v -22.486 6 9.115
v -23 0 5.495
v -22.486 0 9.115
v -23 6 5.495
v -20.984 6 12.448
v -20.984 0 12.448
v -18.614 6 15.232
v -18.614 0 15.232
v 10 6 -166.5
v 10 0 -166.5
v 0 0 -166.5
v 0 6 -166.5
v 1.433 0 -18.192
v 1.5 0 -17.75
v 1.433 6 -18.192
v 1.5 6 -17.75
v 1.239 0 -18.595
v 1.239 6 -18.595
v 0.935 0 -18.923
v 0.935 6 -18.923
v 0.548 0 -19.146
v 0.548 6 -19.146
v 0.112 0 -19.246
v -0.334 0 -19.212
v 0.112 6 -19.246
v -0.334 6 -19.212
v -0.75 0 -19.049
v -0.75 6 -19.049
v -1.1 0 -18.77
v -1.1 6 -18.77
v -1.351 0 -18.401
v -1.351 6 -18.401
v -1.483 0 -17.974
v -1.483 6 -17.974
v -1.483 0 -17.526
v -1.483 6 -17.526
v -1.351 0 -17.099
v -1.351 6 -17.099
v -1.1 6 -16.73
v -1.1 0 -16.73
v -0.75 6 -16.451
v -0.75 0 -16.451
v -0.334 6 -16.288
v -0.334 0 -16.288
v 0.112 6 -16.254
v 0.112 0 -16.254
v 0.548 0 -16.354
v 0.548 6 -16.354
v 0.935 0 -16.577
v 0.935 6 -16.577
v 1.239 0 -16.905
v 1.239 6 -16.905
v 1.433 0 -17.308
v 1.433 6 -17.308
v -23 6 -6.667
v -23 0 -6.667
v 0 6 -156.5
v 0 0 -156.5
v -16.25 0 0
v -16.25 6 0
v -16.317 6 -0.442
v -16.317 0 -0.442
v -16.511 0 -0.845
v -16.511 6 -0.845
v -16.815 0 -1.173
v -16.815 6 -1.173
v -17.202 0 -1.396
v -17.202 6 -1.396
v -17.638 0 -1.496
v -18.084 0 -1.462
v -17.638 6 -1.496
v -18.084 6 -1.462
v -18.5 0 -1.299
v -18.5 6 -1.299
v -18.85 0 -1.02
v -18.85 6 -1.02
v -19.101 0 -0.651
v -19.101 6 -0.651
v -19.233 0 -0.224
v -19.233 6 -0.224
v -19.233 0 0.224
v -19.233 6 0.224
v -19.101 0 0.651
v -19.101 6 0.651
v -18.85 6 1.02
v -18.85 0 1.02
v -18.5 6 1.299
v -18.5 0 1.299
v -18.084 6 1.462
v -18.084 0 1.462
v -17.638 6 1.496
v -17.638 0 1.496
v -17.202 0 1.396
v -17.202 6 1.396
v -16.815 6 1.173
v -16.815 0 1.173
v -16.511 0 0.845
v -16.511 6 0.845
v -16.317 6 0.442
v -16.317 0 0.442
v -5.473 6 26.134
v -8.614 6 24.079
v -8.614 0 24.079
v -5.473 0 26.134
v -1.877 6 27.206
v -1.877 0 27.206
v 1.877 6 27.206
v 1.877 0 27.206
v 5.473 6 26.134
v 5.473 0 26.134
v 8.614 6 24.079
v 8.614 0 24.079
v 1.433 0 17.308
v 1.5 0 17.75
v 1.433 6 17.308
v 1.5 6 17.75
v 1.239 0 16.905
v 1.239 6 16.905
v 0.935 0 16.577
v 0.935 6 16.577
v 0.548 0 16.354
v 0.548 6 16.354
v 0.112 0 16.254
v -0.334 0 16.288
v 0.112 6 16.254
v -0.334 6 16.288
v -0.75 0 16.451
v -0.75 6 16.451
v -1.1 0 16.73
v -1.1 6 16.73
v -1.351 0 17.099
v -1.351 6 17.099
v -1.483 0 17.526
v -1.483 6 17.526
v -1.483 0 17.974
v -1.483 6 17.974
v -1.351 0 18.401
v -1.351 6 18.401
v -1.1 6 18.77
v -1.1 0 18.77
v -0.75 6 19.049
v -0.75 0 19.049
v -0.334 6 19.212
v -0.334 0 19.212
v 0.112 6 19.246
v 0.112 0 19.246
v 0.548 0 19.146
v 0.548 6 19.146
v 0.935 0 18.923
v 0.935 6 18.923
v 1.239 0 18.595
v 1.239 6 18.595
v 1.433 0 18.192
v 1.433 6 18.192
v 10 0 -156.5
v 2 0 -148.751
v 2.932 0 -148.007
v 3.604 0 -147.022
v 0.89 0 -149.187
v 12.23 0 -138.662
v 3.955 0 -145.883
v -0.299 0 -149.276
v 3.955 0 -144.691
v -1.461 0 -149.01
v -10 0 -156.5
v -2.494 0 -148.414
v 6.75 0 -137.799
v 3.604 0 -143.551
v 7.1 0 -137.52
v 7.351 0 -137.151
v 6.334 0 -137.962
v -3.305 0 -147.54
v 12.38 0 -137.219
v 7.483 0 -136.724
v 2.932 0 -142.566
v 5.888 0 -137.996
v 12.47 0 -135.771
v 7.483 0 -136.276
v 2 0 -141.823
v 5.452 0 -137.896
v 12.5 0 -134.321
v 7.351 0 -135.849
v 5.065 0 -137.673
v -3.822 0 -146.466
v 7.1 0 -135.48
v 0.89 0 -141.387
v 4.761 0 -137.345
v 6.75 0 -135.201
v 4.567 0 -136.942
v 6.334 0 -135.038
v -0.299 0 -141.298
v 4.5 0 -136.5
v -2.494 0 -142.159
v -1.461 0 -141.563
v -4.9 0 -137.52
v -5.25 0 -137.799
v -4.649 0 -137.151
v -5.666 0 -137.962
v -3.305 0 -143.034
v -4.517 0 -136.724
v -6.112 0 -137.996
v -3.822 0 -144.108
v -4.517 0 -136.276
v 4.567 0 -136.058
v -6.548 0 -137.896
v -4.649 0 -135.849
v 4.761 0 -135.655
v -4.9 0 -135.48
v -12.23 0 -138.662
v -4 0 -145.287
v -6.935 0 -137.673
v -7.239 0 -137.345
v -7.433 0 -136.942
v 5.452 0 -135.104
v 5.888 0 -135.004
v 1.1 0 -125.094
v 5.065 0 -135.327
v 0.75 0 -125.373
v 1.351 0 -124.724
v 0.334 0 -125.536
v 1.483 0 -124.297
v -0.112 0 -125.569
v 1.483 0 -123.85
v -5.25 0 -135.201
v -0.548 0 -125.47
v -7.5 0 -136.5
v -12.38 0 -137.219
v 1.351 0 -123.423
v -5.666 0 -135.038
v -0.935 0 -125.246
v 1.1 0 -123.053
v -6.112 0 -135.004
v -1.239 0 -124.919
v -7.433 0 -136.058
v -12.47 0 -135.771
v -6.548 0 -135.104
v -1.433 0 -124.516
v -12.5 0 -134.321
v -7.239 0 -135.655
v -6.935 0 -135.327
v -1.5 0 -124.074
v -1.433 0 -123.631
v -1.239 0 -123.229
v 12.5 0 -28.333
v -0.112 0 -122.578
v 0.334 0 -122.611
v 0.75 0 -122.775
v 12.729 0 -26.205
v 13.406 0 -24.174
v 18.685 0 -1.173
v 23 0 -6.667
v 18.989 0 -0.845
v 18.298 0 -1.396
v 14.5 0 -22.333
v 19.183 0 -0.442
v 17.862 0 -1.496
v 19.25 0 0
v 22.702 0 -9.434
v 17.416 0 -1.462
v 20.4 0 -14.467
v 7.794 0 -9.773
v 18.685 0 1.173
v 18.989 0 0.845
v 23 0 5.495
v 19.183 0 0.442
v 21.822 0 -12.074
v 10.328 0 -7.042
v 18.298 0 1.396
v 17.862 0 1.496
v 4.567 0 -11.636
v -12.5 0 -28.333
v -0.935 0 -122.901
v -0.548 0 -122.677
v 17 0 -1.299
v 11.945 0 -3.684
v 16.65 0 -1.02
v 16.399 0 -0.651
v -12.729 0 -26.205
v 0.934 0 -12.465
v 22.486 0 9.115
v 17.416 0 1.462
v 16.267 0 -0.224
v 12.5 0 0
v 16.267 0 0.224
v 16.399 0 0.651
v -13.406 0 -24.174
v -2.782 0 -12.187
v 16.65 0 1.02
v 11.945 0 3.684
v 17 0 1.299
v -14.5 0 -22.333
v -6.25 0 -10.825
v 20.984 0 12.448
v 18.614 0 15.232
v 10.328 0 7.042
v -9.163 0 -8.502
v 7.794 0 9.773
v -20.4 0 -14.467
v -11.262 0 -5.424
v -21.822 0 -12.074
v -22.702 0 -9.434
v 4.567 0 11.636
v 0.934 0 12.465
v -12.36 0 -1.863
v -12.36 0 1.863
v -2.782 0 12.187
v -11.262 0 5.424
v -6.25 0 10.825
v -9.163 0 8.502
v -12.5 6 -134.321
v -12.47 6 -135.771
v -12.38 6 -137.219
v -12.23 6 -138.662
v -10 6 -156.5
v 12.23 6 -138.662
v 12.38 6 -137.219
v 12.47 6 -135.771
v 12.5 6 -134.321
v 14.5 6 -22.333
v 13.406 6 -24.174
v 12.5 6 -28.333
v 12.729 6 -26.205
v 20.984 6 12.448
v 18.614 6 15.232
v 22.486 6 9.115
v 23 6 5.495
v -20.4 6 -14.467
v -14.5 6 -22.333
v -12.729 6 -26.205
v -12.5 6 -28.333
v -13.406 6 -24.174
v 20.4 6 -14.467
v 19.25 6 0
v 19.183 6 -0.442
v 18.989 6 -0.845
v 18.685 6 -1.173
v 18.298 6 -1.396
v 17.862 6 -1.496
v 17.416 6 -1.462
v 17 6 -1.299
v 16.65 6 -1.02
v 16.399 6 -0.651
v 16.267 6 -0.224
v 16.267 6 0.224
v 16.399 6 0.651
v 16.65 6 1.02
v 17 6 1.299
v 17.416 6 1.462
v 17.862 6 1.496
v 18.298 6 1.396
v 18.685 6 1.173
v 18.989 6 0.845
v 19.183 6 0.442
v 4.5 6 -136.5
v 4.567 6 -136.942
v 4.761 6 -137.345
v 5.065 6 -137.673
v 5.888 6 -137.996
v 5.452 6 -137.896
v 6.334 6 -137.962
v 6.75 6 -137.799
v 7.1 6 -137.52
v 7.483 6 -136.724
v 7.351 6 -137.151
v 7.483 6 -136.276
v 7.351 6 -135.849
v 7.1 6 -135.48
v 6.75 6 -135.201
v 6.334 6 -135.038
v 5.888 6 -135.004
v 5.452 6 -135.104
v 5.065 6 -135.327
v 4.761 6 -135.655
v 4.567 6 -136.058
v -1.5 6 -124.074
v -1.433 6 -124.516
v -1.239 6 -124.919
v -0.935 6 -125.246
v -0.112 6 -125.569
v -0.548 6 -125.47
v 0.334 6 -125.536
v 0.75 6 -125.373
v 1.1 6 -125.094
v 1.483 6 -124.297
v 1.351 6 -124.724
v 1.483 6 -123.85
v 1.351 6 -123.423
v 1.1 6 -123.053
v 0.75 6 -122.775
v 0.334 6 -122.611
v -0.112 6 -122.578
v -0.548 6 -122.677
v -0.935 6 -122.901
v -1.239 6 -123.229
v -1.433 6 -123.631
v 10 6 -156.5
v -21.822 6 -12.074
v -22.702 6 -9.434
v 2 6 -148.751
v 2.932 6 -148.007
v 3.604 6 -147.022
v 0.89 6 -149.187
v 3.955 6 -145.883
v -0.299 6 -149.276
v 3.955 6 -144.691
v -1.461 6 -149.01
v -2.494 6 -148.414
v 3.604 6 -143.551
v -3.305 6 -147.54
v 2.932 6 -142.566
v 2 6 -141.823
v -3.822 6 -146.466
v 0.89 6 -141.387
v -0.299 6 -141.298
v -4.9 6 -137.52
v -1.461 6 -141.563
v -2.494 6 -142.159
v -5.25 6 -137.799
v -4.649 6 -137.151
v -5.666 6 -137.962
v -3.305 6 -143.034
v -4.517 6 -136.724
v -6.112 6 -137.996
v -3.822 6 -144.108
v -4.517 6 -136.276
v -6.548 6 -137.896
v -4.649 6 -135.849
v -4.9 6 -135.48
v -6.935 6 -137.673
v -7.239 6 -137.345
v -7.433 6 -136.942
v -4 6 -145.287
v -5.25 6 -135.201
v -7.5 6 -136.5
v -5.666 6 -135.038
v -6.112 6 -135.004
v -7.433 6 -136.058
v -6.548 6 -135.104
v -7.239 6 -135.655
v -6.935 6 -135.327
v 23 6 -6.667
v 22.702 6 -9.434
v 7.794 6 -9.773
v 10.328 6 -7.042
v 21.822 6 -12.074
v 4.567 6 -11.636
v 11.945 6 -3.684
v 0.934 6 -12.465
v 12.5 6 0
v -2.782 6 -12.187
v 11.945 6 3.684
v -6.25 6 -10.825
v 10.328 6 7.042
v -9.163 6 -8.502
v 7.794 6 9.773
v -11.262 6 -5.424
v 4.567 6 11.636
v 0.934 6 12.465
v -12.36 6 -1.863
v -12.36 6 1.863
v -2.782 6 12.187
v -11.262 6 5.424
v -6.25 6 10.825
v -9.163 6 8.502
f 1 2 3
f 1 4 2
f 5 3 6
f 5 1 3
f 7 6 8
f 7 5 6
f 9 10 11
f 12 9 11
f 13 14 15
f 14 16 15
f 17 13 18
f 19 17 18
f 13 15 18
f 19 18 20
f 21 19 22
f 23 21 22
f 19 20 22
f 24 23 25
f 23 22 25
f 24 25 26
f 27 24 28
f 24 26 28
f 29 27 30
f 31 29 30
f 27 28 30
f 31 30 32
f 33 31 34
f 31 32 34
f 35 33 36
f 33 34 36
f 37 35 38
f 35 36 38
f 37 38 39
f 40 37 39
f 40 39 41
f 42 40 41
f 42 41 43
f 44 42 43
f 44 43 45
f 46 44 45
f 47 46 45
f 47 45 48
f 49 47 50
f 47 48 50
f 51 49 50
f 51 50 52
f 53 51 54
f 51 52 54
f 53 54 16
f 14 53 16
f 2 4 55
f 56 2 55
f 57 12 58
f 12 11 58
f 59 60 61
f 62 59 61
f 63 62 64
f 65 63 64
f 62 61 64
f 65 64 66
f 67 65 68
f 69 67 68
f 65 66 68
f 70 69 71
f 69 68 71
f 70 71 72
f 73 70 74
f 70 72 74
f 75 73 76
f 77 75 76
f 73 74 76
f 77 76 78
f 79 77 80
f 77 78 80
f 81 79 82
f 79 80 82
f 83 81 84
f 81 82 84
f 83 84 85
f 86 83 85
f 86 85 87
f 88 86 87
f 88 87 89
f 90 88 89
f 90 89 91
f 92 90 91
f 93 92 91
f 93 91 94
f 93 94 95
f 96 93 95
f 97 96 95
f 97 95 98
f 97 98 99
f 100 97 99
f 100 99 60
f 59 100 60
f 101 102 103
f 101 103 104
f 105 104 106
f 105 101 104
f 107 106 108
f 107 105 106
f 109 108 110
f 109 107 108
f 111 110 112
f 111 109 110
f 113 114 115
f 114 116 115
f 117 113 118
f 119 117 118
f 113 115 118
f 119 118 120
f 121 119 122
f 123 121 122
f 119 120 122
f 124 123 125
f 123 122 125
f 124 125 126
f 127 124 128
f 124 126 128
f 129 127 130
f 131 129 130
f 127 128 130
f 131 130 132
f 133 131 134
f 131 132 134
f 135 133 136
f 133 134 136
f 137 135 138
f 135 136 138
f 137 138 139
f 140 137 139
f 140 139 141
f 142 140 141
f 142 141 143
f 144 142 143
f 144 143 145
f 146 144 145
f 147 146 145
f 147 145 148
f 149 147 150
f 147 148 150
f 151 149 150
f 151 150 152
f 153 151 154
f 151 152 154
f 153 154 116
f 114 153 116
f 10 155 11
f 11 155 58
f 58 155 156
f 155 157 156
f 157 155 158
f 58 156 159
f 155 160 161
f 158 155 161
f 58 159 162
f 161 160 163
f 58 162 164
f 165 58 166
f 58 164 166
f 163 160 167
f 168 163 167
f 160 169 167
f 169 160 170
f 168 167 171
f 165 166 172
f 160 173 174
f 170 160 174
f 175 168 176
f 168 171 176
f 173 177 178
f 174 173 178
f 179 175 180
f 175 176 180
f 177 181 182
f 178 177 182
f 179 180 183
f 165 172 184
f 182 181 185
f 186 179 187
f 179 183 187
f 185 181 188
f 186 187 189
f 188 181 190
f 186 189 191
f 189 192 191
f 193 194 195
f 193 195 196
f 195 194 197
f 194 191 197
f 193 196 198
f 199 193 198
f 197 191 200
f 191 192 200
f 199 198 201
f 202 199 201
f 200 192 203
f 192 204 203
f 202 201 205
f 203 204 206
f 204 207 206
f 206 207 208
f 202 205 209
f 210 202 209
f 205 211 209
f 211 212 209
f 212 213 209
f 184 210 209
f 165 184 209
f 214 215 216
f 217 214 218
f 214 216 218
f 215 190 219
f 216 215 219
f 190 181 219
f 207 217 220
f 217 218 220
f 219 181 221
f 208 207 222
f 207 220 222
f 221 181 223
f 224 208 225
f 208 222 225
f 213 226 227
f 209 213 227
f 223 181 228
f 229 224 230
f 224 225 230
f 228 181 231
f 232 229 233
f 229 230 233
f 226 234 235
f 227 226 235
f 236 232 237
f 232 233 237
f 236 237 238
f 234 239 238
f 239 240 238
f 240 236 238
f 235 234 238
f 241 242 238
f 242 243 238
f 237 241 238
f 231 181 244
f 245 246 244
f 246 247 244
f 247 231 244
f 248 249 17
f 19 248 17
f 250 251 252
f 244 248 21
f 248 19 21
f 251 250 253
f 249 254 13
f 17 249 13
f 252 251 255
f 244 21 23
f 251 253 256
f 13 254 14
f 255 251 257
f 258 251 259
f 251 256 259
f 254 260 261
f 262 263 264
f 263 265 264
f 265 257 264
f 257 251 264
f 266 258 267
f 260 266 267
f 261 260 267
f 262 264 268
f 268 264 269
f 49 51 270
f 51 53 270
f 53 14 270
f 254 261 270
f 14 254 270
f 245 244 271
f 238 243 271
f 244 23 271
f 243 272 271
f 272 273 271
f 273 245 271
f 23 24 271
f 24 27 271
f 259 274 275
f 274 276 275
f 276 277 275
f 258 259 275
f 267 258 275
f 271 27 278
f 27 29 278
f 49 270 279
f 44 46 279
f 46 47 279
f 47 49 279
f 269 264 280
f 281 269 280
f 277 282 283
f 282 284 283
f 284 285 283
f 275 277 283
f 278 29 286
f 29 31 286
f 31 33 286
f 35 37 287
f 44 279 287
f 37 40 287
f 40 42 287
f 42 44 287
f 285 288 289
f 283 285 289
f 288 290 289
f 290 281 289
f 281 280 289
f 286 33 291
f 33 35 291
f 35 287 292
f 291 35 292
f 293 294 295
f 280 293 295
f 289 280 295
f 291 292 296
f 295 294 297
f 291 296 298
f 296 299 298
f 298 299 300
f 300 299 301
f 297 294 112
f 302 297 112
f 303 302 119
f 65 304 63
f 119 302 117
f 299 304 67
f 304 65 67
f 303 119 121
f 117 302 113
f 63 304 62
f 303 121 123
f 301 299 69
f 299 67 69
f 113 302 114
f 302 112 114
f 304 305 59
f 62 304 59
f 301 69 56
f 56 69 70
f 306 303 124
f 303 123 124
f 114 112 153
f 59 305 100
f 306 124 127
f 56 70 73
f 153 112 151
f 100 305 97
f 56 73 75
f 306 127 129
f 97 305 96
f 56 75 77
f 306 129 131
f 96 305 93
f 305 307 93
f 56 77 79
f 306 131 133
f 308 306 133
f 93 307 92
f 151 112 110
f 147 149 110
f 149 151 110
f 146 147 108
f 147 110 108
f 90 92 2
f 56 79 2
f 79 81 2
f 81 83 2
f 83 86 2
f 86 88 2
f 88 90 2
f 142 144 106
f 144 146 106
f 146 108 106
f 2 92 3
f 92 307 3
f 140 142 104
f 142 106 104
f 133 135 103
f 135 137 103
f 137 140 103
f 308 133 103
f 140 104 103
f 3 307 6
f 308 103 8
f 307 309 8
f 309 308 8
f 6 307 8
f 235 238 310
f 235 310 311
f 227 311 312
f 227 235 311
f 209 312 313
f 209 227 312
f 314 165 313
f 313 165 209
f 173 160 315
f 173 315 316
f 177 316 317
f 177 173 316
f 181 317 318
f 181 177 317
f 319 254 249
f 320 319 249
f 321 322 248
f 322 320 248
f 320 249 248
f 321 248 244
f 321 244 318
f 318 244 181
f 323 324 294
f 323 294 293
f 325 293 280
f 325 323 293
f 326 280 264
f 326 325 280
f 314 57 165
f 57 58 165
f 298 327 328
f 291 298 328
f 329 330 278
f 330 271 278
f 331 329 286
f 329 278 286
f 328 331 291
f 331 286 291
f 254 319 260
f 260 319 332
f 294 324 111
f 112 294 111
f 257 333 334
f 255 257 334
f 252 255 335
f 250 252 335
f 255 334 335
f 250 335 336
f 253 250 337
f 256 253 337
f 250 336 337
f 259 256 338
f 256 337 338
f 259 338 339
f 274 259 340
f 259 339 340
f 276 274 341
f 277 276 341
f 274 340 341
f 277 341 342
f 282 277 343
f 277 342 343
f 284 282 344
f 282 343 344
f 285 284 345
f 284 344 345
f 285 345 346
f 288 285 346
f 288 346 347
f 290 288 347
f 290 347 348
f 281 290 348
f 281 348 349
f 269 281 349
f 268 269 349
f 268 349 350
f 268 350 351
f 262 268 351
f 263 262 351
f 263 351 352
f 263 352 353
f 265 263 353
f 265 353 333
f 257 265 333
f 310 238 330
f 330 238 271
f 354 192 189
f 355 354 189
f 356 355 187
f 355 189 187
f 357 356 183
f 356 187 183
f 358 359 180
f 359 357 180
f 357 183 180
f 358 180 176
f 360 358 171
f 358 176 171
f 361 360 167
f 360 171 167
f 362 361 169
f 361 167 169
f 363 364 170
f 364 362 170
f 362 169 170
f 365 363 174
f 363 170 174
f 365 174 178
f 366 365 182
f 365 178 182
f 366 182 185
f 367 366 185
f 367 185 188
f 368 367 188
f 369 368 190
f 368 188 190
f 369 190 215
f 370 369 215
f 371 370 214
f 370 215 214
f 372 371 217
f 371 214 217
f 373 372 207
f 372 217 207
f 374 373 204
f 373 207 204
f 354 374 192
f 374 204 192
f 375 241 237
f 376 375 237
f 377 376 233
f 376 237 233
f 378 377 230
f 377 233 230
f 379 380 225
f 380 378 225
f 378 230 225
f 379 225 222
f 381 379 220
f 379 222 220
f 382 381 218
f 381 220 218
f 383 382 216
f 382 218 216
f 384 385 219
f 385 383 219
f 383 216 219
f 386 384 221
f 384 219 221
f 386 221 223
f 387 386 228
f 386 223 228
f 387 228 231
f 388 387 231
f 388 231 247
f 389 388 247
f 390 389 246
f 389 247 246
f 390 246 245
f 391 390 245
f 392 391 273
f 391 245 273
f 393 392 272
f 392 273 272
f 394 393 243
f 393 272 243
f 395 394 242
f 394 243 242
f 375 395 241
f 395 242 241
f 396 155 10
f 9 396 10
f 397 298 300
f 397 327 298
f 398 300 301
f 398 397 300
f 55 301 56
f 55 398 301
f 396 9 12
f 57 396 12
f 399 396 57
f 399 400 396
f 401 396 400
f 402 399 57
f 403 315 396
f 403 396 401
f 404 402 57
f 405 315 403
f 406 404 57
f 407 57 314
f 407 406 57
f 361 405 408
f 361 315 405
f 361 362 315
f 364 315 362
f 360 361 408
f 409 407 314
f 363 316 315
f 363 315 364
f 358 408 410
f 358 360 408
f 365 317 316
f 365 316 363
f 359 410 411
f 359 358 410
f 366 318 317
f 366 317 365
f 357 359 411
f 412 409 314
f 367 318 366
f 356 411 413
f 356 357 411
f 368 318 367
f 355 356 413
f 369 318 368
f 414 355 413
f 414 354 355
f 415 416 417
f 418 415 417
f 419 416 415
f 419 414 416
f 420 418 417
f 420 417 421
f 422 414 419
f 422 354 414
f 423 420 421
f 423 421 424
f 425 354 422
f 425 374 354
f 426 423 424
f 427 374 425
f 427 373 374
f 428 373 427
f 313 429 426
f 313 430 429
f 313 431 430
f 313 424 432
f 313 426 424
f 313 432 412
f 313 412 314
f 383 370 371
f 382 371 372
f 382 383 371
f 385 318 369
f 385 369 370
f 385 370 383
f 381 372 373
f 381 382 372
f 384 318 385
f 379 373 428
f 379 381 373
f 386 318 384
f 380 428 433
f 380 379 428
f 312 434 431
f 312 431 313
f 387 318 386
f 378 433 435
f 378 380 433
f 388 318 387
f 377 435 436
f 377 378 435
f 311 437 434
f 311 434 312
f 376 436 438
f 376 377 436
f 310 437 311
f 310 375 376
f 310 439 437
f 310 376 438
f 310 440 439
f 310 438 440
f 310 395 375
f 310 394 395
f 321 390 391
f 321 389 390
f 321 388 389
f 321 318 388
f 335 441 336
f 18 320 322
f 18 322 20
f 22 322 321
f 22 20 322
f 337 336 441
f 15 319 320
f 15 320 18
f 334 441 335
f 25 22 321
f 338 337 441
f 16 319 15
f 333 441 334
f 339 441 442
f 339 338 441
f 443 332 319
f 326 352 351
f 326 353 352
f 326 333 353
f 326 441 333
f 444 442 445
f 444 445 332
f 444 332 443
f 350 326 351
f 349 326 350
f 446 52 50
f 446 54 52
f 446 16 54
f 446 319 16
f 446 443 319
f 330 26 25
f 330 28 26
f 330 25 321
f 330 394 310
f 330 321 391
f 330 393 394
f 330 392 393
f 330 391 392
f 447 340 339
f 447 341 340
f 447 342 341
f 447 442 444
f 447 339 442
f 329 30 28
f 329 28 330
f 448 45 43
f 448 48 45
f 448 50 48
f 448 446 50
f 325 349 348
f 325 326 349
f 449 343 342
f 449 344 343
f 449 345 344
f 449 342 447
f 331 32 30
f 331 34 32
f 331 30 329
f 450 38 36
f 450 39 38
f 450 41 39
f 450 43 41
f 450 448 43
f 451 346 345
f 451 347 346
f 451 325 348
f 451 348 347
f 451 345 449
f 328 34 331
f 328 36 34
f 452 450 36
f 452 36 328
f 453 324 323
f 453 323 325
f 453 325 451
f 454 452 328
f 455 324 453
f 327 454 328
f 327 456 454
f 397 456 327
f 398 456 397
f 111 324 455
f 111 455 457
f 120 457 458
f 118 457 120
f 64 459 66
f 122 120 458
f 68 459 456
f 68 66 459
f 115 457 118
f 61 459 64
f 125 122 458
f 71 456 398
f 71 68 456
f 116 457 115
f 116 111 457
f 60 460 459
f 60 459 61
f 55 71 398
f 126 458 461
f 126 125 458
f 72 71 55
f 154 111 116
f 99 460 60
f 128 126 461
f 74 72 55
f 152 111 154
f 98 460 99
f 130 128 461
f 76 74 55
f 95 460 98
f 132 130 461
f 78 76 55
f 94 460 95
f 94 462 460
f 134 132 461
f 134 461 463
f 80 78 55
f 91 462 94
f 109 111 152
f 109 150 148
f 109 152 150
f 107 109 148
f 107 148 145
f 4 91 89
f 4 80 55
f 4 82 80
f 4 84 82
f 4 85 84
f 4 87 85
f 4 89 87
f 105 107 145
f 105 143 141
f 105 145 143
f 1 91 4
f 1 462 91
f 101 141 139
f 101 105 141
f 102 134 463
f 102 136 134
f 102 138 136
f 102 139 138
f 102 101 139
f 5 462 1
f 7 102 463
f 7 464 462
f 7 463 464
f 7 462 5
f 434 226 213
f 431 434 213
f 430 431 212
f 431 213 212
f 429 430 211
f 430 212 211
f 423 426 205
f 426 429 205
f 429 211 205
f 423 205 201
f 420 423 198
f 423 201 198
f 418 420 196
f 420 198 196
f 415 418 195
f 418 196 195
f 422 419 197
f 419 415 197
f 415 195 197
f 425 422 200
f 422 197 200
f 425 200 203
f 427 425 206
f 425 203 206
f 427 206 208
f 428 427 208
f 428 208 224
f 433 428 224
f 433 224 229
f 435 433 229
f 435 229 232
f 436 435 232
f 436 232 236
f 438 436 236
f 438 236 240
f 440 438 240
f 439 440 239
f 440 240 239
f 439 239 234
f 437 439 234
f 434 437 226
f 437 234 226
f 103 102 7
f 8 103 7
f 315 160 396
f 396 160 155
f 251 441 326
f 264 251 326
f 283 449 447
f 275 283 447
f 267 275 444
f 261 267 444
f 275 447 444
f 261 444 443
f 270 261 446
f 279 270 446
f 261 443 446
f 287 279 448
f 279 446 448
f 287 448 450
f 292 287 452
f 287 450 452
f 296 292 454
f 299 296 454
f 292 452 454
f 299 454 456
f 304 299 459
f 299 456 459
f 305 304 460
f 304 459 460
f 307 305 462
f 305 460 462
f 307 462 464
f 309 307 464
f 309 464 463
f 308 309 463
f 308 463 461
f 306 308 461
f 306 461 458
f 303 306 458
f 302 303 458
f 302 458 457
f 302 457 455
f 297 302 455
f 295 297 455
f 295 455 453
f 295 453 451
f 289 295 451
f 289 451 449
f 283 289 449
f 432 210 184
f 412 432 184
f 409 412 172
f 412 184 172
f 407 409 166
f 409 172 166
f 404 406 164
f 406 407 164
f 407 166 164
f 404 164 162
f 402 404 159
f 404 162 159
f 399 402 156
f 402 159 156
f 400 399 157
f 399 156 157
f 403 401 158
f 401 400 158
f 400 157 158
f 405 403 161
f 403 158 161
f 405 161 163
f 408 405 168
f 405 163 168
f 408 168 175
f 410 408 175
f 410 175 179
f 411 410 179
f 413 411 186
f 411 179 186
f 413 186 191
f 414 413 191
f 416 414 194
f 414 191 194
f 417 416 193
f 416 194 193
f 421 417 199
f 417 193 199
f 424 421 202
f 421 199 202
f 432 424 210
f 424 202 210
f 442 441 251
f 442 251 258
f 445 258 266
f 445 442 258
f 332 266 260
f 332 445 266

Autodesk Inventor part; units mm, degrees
ref_plane "YZ Plane" through (0, 0, 0) normal (1, 0, 0) x (0, 1, 0)
ref_plane "XZ Plane" through (0, 0, 0) normal (0, 1, 0) x (-1, 0, 0)
ref_plane "XY Plane" through (0, 0, 0) normal (0, 0, 1) x (1, 0, 0)
sketch "Sketch1" plane through (0, 0, 0) normal (0, 1, 0) x (-1, 0, 0)
  arc A0 (4.5962, 6.7175) -> (6.7175, 4.5962) centre (5.6569, 5.6569) ccw
  line L0 (5.6569, 7.7782) -> (4.5962, 6.7175)
  arc A1 (7.7782, 5.6569) -> (5.6569, 7.7782) centre (6.7175, 6.7175) ccw
  line L1 (6.7175, 4.5962) -> (7.7782, 5.6569)
  circle A2 centre (0, 0) radius 3
  circle A3 centre (0, -124.0736) radius 1.5
  circle A4 centre (0, -145.2868) radius 4
  arc A5 (-4.5962, -6.7175) -> (-6.7175, -4.5962) centre (-5.6569, -5.6569) ccw
  line L2 (-5.6569, -7.7782) -> (-4.5962, -6.7175)
  arc A6 (-7.7782, -5.6569) -> (-5.6569, -7.7782) centre (-6.7175, -6.7175) ccw
  line L3 (-6.7175, -4.5962) -> (-7.7782, -5.6569)
  line L4 (-20, 5.4953) -> (-20, -6.6667)
  arc A7 (-20, -6.6667) -> (-18, -12.6667) centre (-10, -6.6667) ccw
  line L5 (-18, -12.6667) -> (-14.5, -17.3333)
  arc A8 (-12.5, -23.3333) -> (-14.5, -17.3333) centre (-22.5, -23.3333) ccw
  line L6 (-12.5, -23.3333) -> (-12.5, -134.321)
  arc A9 (-12.5, -134.321) -> (-12.2297, -138.6622) centre (22.5, -134.321) ccw
  line L7 (-12.2297, -138.6622) -> (-10, -156.5)
  line L8 (-10, -156.5) -> (-10, -166.5)
  line L9 (-10, -166.5) -> (0, -166.5)
  line L10 (0, -166.5) -> (0, -156.5)
  line L11 (0, -156.5) -> (10, -156.5)
  line L12 (10, -156.5) -> (12.2297, -138.6622)
  arc A10 (12.2297, -138.6622) -> (12.5, -134.321) centre (-22.5, -134.321) ccw
  line L13 (12.5, -134.321) -> (12.5, -23.3333)
  arc A11 (14.5, -17.3333) -> (12.5, -23.3333) centre (22.5, -23.3333) ccw
  line L14 (14.5, -17.3333) -> (18, -12.6667)
  arc A12 (18, -12.6667) -> (20, -6.6667) centre (10, -6.6667) ccw
  line L15 (20, -6.6667) -> (20, 5.4953)
  arc A13 (20, 5.4953) -> (16.6262, 12.9849) centre (10, 5.4953) ccw
  line L16 (16.6262, 12.9849) -> (6.6262, 21.8321)
  arc A14 (6.6262, 21.8321) -> (-6.6262, 21.8321) centre (0, 14.3426) ccw
  line L17 (-6.6262, 21.8321) -> (-16.6262, 12.9849)
  arc A15 (-16.6262, 12.9849) -> (-20, 5.4953) centre (-10, 5.4953) ccw
  arc A16 (-6.7175, 4.5962) -> (-4.5962, 6.7175) centre (-5.6569, 5.6569) ccw
  line L18 (-7.7782, 5.6569) -> (-6.7175, 4.5962)
  arc A17 (-5.6569, 7.7782) -> (-7.7782, 5.6569) centre (-6.7175, 6.7175) ccw
  line L19 (-4.5962, 6.7175) -> (-5.6569, 7.7782)
  arc A18 (6.7175, -4.5962) -> (4.5962, -6.7175) centre (5.6569, -5.6569) ccw
  line L20 (7.7782, -5.6569) -> (6.7175, -4.5962)
  arc A19 (5.6569, -7.7782) -> (7.7782, -5.6569) centre (6.7175, -6.7175) ccw
  line L21 (4.5962, -6.7175) -> (5.6569, -7.7782)
  circle A20 centre (6, -136.5) radius 1.5
  circle A21 centre (-6, -136.5) radius 1.5
  point P0 (18, -12.6667)
  point P1 (16.6262, 12.9849)
  point P2 (6.6262, 21.8321)
  point P3 (-6.6262, 21.8321)
  point P4 (-16.6262, 12.9849)
  point P5 (-18, -12.6667)
  point P6 (-14.5, -17.3333)
  point P7 (-12.5, -23.3333)
  point P8 (-12.5, -134.321)
  point P9 (-12.2297, -138.6622)
  point P10 (12.2297, -138.6622)
  point P11 (12.5, -134.321)
  point P12 (12.5, -23.3333)
  point P13 (14.5, -17.3333)
  point P14 (-6.7175, -4.5962)
  point P15 (-4.5962, -6.7175)
  point P16 (-5.6569, -7.7782)
  point P17 (-7.7782, -5.6569)
  point P18 (7.7782, 5.6569)
  point P19 (6.7175, 4.5962)
  point P20 (4.5962, 6.7175)
  point P21 (5.6569, 7.7782)
  point P22 (-5.6569, 7.7782)
  point P23 (-4.5962, 6.7175)
  point P24 (-6.7175, 4.5962)
  point P25 (-7.7782, 5.6569)
  point P26 (6.7175, -4.5962)
  point P27 (7.7782, -5.6569)
  point P28 (5.6569, -7.7782)
  point P29 (4.5962, -6.7175)
extrude "Extrusion1" add sketch "Sketch1" along normal blind 6
sketch "Sketch2" plane through (0, 6, 0) normal (0, 1, 0) x (1, 0, 0)
  line L0 (20, -5.4953) -> (20, 6.6667) projected
  arc A0 (20, 6.6667) -> (18, 12.6667) centre (10, 6.6667) ccw projected
  line L1 (18, 12.6667) -> (14.5, 17.3333) projected
  arc A1 (12.5, 23.3333) -> (14.5, 17.3333) centre (22.5, 23.3333) ccw projected
  line L2 (12.5, 23.3333) -> (12.5, 134.321) projected
  arc A2 (12.5, 134.321) -> (12.2297, 138.6622) centre (-22.5, 134.321) ccw projected
  line L3 (12.2297, 138.6622) -> (10, 156.5) projected
  line L4 (10, 156.5) -> (10, 166.5) projected
  line L5 (10, 166.5) -> (0, 166.5) projected
  line L6 (0, 166.5) -> (0, 156.5) projected
  line L7 (0, 156.5) -> (-10, 156.5) projected
  line L8 (-10, 156.5) -> (-12.2297, 138.6622) projected
  arc A3 (-12.2297, 138.6622) -> (-12.5, 134.321) centre (22.5, 134.321) ccw projected
  line L9 (-12.5, 134.321) -> (-12.5, 23.3333) projected
  arc A4 (-14.5, 17.3333) -> (-12.5, 23.3333) centre (-22.5, 23.3333) ccw projected
  line L10 (-14.5, 17.3333) -> (-18, 12.6667) projected
  arc A5 (-18, 12.6667) -> (-20, 6.6667) centre (-10, 6.6667) ccw projected
  line L11 (-20, 6.6667) -> (-20, -5.4953) projected
  arc A6 (-20, -5.4953) -> (-16.6262, -12.9849) centre (-10, -5.4953) ccw projected
  line L12 (-16.6262, -12.9849) -> (-6.6262, -21.8321) projected
  arc A7 (-6.6262, -21.8321) -> (6.6262, -21.8321) centre (0, -14.3426) ccw projected
  line L13 (6.6262, -21.8321) -> (16.6262, -12.9849) projected
  arc A8 (16.6262, -12.9849) -> (20, -5.4953) centre (10, -5.4953) ccw projected
  circle A9 centre (0, 0) radius 3 projected
  circle A10 centre (0, 145.2868) radius 4 projected
  circle A11 centre (-6, 136.5) radius 1.5 projected
  circle A12 centre (6, 136.5) radius 1.5 projected
  circle A13 centre (0, 124.0736) radius 1.5 projected
  line L14 (7.7782, 5.6569) -> (6.7175, 4.5962) projected
  arc A14 (4.5962, 6.7175) -> (6.7175, 4.5962) centre (5.6569, 5.6569) ccw projected
  line L15 (4.5962, 6.7175) -> (5.6569, 7.7782) projected
  arc A15 (7.7782, 5.6569) -> (5.6569, 7.7782) centre (6.7175, 6.7175) ccw projected
  line L16 (-7.7782, -5.6569) -> (-6.7175, -4.5962) projected
  arc A16 (-4.5962, -6.7175) -> (-6.7175, -4.5962) centre (-5.6569, -5.6569) ccw projected
  line L17 (-4.5962, -6.7175) -> (-5.6569, -7.7782) projected
  arc A17 (-7.7782, -5.6569) -> (-5.6569, -7.7782) centre (-6.7175, -6.7175) ccw projected
  arc A18 (5.6569, -7.7782) -> (7.7782, -5.6569) centre (6.7175, -6.7175) ccw projected
  line L18 (5.6569, -7.7782) -> (4.5962, -6.7175) projected
  arc A19 (6.7175, -4.5962) -> (4.5962, -6.7175) centre (5.6569, -5.6569) ccw projected
  line L19 (6.7175, -4.5962) -> (7.7782, -5.6569) projected
  line L20 (-6.7175, 4.5962) -> (-7.7782, 5.6569) projected
  arc A20 (-5.6569, 7.7782) -> (-7.7782, 5.6569) centre (-6.7175, 6.7175) ccw projected
  line L21 (-5.6569, 7.7782) -> (-4.5962, 6.7175) projected
  arc A21 (-6.7175, 4.5962) -> (-4.5962, 6.7175) centre (-5.6569, 5.6569) ccw projected
  line L22 (18.6141, -15.2318) -> (8.6141, -24.079)
  arc A22 (-8.6141, -24.079) -> (8.6141, -24.079) centre (0, -14.3426) ccw
  line L23 (-8.6141, -24.079) -> (-18.6141, -15.2318)
  arc A23 (-23, -5.4953) -> (-18.6141, -15.2318) centre (-10, -5.4953) ccw
  line L24 (-23, -5.4953) -> (-23, 6.6667)
  arc A24 (-20.4, 14.4667) -> (-23, 6.6667) centre (-10, 6.6667) ccw
  line L25 (-20.4, 14.4667) -> (-12.5, 25)
  line L26 (-15.5, 23.3333) -> (-15.5, 134.321)
  arc A25 (-15.2066, 139.0343) -> (-15.5, 134.321) centre (22.5, 134.321) ccw
  line L27 (-15.2066, 139.0343) -> (-12.6483, 159.5)
  line L28 (-12.6483, 159.5) -> (-3, 159.5)
  line L29 (-3, 159.5) -> (-3, 169.5)
  line L30 (-3, 169.5) -> (13, 169.5)
  line L31 (13, 169.5) -> (13, 156.6868)
  line L32 (13, 156.6868) -> (15.2066, 139.0343)
  arc A26 (15.5, 134.321) -> (15.2066, 139.0343) centre (-22.5, 134.321) ccw
  line L33 (15.5, 134.321) -> (15.5, 23.3333)
  line L34 (12.5, 25) -> (20.4, 14.4667)
  arc A27 (23, 6.6667) -> (20.4, 14.4667) centre (10, 6.6667) ccw
  line L35 (23, 6.6667) -> (23, -5.4953)
  arc A28 (18.6141, -15.2318) -> (23, -5.4953) centre (10, -5.4953) ccw
  dimension "d2" = 3
extrude "Extrusion2" add sketch "Sketch2" against normal blind 6 contours L0 A0 L1 A1 L2 L34 A27 L35 A28 L22 A22 L23 A23 L24 A24 L25 L9 A4 L10 A5 L11 A6 L12 A7 L13 A8
sketch "Sketch3" plane through (0, 6, 0) normal (0, 1, 0) x (1, 0, 0)
  line L0 (12.5, 25) -> (12.5, 134.321) projected
  arc A0 (12.5, 134.321) -> (12.2297, 138.6622) centre (-22.5, 134.321) ccw projected
  line L1 (12.2297, 138.6622) -> (10, 156.5) projected
  line L2 (10, 156.5) -> (10, 166.5) projected
  line L3 (10, 166.5) -> (0, 166.5) projected
  line L4 (0, 166.5) -> (0, 156.5) projected
  line L5 (0, 156.5) -> (-10, 156.5) projected
  line L6 (-10, 156.5) -> (-12.2297, 138.6622) projected
  arc A1 (-12.2297, 138.6622) -> (-12.5, 134.321) centre (22.5, 134.321) ccw projected
  line L7 (-12.5, 134.321) -> (-12.5, 25) projected
  circle A2 centre (0, 0) radius 3 projected
  circle A3 centre (0, 145.2868) radius 4 projected
  circle A4 centre (-6, 136.5) radius 1.5 projected
  circle A5 centre (6, 136.5) radius 1.5 projected
  circle A6 centre (0, 124.0736) radius 1.5 projected
  line L8 (7.7782, 5.6569) -> (6.7175, 4.5962) projected
  arc A7 (4.5962, 6.7175) -> (6.7175, 4.5962) centre (5.6569, 5.6569) ccw projected
  line L9 (4.5962, 6.7175) -> (5.6569, 7.7782) projected
  arc A8 (7.7782, 5.6569) -> (5.6569, 7.7782) centre (6.7175, 6.7175) ccw projected
  line L10 (-7.7782, -5.6569) -> (-6.7175, -4.5962) projected
  arc A9 (-4.5962, -6.7175) -> (-6.7175, -4.5962) centre (-5.6569, -5.6569) ccw projected
  line L11 (-4.5962, -6.7175) -> (-5.6569, -7.7782) projected
  arc A10 (-7.7782, -5.6569) -> (-5.6569, -7.7782) centre (-6.7175, -6.7175) ccw projected
  arc A11 (5.6569, -7.7782) -> (7.7782, -5.6569) centre (6.7175, -6.7175) ccw projected
  line L12 (5.6569, -7.7782) -> (4.5962, -6.7175) projected
  arc A12 (6.7175, -4.5962) -> (4.5962, -6.7175) centre (5.6569, -5.6569) ccw projected
  line L13 (6.7175, -4.5962) -> (7.7782, -5.6569) projected
  line L14 (-6.7175, 4.5962) -> (-7.7782, 5.6569) projected
  arc A13 (-5.6569, 7.7782) -> (-7.7782, 5.6569) centre (-6.7175, 6.7175) ccw projected
  line L15 (-5.6569, 7.7782) -> (-4.5962, 6.7175) projected
  arc A14 (-6.7175, 4.5962) -> (-4.5962, 6.7175) centre (-5.6569, 5.6569) ccw projected
  line L16 (-12.5, 25) -> (-20.4, 14.4667) projected
  arc A15 (-20.4, 14.4667) -> (-23, 6.6667) centre (-10, 6.6667) ccw projected
  line L17 (-23, 6.6667) -> (-23, -5.4953) projected
  arc A16 (-23, -5.4953) -> (-18.6141, -15.2318) centre (-10, -5.4953) ccw projected
  line L18 (-18.6141, -15.2318) -> (-8.6141, -24.079) projected
  arc A17 (-8.6141, -24.079) -> (8.6141, -24.079) centre (0, -14.3426) ccw projected
  line L19 (8.6141, -24.079) -> (18.6141, -15.2318) projected
  arc A18 (18.6141, -15.2318) -> (23, -5.4953) centre (10, -5.4953) ccw projected
  line L20 (23, -5.4953) -> (23, 6.6667) projected
  arc A19 (23, 6.6667) -> (20.4, 14.4667) centre (10, 6.6667) ccw projected
  line L21 (20.4, 14.4667) -> (12.5, 25) projected
  circle A20 centre (-6.7175, -6.7175) radius 3 construction
  line L22 (0, 0) -> (-8.8388, -8.8388) construction
  circle A21 centre (0, 0) radius 12.5
  dimension "d8" = 6
fillet "Fillet1" radius 10 2 edges at (12.5, 3, -25) (-12.5, 3, -25)
extrude "Extrusion3" cut sketch "Sketch3" against normal blind 6 contours A21
sketch "Sketch4" plane through (0, 6, 0) normal (0, 1, 0) x (1, 0, 0)
  circle A0 centre (0, 0) radius 12.5 construction
  circle A1 centre (0, 0) radius 12.5 construction
  line L0 (12.5, 0) -> (23, 0) construction
  line L1 (23, -5.4953) -> (23, 6.6667) construction
  circle A2 centre (0, 0) radius 17.75 construction
  line L2 (0, -12.5) -> (0, -17.75) construction
  line L3 (-12.5, 0) -> (-17.75, 0) construction
  line L4 (0, 12.5) -> (0, 17.75) construction
  circle A3 centre (17.75, 0) radius 1.5
  circle A4 centre (0, 17.75) radius 1.5
  circle A5 centre (-17.75, 0) radius 1.5
  circle A6 centre (0, -17.75) radius 1.5
  dimension "d11" = 3
  dimension "d14" = 360
extrude "Extrusion4" cut sketch "Sketch4" against normal up to next
sketch "Sketch5" plane through (0, 6, 0) normal (0, 1, 0) x (1, 0, 0)
  point P0 (0, 0)
properties part number "mod arms"
